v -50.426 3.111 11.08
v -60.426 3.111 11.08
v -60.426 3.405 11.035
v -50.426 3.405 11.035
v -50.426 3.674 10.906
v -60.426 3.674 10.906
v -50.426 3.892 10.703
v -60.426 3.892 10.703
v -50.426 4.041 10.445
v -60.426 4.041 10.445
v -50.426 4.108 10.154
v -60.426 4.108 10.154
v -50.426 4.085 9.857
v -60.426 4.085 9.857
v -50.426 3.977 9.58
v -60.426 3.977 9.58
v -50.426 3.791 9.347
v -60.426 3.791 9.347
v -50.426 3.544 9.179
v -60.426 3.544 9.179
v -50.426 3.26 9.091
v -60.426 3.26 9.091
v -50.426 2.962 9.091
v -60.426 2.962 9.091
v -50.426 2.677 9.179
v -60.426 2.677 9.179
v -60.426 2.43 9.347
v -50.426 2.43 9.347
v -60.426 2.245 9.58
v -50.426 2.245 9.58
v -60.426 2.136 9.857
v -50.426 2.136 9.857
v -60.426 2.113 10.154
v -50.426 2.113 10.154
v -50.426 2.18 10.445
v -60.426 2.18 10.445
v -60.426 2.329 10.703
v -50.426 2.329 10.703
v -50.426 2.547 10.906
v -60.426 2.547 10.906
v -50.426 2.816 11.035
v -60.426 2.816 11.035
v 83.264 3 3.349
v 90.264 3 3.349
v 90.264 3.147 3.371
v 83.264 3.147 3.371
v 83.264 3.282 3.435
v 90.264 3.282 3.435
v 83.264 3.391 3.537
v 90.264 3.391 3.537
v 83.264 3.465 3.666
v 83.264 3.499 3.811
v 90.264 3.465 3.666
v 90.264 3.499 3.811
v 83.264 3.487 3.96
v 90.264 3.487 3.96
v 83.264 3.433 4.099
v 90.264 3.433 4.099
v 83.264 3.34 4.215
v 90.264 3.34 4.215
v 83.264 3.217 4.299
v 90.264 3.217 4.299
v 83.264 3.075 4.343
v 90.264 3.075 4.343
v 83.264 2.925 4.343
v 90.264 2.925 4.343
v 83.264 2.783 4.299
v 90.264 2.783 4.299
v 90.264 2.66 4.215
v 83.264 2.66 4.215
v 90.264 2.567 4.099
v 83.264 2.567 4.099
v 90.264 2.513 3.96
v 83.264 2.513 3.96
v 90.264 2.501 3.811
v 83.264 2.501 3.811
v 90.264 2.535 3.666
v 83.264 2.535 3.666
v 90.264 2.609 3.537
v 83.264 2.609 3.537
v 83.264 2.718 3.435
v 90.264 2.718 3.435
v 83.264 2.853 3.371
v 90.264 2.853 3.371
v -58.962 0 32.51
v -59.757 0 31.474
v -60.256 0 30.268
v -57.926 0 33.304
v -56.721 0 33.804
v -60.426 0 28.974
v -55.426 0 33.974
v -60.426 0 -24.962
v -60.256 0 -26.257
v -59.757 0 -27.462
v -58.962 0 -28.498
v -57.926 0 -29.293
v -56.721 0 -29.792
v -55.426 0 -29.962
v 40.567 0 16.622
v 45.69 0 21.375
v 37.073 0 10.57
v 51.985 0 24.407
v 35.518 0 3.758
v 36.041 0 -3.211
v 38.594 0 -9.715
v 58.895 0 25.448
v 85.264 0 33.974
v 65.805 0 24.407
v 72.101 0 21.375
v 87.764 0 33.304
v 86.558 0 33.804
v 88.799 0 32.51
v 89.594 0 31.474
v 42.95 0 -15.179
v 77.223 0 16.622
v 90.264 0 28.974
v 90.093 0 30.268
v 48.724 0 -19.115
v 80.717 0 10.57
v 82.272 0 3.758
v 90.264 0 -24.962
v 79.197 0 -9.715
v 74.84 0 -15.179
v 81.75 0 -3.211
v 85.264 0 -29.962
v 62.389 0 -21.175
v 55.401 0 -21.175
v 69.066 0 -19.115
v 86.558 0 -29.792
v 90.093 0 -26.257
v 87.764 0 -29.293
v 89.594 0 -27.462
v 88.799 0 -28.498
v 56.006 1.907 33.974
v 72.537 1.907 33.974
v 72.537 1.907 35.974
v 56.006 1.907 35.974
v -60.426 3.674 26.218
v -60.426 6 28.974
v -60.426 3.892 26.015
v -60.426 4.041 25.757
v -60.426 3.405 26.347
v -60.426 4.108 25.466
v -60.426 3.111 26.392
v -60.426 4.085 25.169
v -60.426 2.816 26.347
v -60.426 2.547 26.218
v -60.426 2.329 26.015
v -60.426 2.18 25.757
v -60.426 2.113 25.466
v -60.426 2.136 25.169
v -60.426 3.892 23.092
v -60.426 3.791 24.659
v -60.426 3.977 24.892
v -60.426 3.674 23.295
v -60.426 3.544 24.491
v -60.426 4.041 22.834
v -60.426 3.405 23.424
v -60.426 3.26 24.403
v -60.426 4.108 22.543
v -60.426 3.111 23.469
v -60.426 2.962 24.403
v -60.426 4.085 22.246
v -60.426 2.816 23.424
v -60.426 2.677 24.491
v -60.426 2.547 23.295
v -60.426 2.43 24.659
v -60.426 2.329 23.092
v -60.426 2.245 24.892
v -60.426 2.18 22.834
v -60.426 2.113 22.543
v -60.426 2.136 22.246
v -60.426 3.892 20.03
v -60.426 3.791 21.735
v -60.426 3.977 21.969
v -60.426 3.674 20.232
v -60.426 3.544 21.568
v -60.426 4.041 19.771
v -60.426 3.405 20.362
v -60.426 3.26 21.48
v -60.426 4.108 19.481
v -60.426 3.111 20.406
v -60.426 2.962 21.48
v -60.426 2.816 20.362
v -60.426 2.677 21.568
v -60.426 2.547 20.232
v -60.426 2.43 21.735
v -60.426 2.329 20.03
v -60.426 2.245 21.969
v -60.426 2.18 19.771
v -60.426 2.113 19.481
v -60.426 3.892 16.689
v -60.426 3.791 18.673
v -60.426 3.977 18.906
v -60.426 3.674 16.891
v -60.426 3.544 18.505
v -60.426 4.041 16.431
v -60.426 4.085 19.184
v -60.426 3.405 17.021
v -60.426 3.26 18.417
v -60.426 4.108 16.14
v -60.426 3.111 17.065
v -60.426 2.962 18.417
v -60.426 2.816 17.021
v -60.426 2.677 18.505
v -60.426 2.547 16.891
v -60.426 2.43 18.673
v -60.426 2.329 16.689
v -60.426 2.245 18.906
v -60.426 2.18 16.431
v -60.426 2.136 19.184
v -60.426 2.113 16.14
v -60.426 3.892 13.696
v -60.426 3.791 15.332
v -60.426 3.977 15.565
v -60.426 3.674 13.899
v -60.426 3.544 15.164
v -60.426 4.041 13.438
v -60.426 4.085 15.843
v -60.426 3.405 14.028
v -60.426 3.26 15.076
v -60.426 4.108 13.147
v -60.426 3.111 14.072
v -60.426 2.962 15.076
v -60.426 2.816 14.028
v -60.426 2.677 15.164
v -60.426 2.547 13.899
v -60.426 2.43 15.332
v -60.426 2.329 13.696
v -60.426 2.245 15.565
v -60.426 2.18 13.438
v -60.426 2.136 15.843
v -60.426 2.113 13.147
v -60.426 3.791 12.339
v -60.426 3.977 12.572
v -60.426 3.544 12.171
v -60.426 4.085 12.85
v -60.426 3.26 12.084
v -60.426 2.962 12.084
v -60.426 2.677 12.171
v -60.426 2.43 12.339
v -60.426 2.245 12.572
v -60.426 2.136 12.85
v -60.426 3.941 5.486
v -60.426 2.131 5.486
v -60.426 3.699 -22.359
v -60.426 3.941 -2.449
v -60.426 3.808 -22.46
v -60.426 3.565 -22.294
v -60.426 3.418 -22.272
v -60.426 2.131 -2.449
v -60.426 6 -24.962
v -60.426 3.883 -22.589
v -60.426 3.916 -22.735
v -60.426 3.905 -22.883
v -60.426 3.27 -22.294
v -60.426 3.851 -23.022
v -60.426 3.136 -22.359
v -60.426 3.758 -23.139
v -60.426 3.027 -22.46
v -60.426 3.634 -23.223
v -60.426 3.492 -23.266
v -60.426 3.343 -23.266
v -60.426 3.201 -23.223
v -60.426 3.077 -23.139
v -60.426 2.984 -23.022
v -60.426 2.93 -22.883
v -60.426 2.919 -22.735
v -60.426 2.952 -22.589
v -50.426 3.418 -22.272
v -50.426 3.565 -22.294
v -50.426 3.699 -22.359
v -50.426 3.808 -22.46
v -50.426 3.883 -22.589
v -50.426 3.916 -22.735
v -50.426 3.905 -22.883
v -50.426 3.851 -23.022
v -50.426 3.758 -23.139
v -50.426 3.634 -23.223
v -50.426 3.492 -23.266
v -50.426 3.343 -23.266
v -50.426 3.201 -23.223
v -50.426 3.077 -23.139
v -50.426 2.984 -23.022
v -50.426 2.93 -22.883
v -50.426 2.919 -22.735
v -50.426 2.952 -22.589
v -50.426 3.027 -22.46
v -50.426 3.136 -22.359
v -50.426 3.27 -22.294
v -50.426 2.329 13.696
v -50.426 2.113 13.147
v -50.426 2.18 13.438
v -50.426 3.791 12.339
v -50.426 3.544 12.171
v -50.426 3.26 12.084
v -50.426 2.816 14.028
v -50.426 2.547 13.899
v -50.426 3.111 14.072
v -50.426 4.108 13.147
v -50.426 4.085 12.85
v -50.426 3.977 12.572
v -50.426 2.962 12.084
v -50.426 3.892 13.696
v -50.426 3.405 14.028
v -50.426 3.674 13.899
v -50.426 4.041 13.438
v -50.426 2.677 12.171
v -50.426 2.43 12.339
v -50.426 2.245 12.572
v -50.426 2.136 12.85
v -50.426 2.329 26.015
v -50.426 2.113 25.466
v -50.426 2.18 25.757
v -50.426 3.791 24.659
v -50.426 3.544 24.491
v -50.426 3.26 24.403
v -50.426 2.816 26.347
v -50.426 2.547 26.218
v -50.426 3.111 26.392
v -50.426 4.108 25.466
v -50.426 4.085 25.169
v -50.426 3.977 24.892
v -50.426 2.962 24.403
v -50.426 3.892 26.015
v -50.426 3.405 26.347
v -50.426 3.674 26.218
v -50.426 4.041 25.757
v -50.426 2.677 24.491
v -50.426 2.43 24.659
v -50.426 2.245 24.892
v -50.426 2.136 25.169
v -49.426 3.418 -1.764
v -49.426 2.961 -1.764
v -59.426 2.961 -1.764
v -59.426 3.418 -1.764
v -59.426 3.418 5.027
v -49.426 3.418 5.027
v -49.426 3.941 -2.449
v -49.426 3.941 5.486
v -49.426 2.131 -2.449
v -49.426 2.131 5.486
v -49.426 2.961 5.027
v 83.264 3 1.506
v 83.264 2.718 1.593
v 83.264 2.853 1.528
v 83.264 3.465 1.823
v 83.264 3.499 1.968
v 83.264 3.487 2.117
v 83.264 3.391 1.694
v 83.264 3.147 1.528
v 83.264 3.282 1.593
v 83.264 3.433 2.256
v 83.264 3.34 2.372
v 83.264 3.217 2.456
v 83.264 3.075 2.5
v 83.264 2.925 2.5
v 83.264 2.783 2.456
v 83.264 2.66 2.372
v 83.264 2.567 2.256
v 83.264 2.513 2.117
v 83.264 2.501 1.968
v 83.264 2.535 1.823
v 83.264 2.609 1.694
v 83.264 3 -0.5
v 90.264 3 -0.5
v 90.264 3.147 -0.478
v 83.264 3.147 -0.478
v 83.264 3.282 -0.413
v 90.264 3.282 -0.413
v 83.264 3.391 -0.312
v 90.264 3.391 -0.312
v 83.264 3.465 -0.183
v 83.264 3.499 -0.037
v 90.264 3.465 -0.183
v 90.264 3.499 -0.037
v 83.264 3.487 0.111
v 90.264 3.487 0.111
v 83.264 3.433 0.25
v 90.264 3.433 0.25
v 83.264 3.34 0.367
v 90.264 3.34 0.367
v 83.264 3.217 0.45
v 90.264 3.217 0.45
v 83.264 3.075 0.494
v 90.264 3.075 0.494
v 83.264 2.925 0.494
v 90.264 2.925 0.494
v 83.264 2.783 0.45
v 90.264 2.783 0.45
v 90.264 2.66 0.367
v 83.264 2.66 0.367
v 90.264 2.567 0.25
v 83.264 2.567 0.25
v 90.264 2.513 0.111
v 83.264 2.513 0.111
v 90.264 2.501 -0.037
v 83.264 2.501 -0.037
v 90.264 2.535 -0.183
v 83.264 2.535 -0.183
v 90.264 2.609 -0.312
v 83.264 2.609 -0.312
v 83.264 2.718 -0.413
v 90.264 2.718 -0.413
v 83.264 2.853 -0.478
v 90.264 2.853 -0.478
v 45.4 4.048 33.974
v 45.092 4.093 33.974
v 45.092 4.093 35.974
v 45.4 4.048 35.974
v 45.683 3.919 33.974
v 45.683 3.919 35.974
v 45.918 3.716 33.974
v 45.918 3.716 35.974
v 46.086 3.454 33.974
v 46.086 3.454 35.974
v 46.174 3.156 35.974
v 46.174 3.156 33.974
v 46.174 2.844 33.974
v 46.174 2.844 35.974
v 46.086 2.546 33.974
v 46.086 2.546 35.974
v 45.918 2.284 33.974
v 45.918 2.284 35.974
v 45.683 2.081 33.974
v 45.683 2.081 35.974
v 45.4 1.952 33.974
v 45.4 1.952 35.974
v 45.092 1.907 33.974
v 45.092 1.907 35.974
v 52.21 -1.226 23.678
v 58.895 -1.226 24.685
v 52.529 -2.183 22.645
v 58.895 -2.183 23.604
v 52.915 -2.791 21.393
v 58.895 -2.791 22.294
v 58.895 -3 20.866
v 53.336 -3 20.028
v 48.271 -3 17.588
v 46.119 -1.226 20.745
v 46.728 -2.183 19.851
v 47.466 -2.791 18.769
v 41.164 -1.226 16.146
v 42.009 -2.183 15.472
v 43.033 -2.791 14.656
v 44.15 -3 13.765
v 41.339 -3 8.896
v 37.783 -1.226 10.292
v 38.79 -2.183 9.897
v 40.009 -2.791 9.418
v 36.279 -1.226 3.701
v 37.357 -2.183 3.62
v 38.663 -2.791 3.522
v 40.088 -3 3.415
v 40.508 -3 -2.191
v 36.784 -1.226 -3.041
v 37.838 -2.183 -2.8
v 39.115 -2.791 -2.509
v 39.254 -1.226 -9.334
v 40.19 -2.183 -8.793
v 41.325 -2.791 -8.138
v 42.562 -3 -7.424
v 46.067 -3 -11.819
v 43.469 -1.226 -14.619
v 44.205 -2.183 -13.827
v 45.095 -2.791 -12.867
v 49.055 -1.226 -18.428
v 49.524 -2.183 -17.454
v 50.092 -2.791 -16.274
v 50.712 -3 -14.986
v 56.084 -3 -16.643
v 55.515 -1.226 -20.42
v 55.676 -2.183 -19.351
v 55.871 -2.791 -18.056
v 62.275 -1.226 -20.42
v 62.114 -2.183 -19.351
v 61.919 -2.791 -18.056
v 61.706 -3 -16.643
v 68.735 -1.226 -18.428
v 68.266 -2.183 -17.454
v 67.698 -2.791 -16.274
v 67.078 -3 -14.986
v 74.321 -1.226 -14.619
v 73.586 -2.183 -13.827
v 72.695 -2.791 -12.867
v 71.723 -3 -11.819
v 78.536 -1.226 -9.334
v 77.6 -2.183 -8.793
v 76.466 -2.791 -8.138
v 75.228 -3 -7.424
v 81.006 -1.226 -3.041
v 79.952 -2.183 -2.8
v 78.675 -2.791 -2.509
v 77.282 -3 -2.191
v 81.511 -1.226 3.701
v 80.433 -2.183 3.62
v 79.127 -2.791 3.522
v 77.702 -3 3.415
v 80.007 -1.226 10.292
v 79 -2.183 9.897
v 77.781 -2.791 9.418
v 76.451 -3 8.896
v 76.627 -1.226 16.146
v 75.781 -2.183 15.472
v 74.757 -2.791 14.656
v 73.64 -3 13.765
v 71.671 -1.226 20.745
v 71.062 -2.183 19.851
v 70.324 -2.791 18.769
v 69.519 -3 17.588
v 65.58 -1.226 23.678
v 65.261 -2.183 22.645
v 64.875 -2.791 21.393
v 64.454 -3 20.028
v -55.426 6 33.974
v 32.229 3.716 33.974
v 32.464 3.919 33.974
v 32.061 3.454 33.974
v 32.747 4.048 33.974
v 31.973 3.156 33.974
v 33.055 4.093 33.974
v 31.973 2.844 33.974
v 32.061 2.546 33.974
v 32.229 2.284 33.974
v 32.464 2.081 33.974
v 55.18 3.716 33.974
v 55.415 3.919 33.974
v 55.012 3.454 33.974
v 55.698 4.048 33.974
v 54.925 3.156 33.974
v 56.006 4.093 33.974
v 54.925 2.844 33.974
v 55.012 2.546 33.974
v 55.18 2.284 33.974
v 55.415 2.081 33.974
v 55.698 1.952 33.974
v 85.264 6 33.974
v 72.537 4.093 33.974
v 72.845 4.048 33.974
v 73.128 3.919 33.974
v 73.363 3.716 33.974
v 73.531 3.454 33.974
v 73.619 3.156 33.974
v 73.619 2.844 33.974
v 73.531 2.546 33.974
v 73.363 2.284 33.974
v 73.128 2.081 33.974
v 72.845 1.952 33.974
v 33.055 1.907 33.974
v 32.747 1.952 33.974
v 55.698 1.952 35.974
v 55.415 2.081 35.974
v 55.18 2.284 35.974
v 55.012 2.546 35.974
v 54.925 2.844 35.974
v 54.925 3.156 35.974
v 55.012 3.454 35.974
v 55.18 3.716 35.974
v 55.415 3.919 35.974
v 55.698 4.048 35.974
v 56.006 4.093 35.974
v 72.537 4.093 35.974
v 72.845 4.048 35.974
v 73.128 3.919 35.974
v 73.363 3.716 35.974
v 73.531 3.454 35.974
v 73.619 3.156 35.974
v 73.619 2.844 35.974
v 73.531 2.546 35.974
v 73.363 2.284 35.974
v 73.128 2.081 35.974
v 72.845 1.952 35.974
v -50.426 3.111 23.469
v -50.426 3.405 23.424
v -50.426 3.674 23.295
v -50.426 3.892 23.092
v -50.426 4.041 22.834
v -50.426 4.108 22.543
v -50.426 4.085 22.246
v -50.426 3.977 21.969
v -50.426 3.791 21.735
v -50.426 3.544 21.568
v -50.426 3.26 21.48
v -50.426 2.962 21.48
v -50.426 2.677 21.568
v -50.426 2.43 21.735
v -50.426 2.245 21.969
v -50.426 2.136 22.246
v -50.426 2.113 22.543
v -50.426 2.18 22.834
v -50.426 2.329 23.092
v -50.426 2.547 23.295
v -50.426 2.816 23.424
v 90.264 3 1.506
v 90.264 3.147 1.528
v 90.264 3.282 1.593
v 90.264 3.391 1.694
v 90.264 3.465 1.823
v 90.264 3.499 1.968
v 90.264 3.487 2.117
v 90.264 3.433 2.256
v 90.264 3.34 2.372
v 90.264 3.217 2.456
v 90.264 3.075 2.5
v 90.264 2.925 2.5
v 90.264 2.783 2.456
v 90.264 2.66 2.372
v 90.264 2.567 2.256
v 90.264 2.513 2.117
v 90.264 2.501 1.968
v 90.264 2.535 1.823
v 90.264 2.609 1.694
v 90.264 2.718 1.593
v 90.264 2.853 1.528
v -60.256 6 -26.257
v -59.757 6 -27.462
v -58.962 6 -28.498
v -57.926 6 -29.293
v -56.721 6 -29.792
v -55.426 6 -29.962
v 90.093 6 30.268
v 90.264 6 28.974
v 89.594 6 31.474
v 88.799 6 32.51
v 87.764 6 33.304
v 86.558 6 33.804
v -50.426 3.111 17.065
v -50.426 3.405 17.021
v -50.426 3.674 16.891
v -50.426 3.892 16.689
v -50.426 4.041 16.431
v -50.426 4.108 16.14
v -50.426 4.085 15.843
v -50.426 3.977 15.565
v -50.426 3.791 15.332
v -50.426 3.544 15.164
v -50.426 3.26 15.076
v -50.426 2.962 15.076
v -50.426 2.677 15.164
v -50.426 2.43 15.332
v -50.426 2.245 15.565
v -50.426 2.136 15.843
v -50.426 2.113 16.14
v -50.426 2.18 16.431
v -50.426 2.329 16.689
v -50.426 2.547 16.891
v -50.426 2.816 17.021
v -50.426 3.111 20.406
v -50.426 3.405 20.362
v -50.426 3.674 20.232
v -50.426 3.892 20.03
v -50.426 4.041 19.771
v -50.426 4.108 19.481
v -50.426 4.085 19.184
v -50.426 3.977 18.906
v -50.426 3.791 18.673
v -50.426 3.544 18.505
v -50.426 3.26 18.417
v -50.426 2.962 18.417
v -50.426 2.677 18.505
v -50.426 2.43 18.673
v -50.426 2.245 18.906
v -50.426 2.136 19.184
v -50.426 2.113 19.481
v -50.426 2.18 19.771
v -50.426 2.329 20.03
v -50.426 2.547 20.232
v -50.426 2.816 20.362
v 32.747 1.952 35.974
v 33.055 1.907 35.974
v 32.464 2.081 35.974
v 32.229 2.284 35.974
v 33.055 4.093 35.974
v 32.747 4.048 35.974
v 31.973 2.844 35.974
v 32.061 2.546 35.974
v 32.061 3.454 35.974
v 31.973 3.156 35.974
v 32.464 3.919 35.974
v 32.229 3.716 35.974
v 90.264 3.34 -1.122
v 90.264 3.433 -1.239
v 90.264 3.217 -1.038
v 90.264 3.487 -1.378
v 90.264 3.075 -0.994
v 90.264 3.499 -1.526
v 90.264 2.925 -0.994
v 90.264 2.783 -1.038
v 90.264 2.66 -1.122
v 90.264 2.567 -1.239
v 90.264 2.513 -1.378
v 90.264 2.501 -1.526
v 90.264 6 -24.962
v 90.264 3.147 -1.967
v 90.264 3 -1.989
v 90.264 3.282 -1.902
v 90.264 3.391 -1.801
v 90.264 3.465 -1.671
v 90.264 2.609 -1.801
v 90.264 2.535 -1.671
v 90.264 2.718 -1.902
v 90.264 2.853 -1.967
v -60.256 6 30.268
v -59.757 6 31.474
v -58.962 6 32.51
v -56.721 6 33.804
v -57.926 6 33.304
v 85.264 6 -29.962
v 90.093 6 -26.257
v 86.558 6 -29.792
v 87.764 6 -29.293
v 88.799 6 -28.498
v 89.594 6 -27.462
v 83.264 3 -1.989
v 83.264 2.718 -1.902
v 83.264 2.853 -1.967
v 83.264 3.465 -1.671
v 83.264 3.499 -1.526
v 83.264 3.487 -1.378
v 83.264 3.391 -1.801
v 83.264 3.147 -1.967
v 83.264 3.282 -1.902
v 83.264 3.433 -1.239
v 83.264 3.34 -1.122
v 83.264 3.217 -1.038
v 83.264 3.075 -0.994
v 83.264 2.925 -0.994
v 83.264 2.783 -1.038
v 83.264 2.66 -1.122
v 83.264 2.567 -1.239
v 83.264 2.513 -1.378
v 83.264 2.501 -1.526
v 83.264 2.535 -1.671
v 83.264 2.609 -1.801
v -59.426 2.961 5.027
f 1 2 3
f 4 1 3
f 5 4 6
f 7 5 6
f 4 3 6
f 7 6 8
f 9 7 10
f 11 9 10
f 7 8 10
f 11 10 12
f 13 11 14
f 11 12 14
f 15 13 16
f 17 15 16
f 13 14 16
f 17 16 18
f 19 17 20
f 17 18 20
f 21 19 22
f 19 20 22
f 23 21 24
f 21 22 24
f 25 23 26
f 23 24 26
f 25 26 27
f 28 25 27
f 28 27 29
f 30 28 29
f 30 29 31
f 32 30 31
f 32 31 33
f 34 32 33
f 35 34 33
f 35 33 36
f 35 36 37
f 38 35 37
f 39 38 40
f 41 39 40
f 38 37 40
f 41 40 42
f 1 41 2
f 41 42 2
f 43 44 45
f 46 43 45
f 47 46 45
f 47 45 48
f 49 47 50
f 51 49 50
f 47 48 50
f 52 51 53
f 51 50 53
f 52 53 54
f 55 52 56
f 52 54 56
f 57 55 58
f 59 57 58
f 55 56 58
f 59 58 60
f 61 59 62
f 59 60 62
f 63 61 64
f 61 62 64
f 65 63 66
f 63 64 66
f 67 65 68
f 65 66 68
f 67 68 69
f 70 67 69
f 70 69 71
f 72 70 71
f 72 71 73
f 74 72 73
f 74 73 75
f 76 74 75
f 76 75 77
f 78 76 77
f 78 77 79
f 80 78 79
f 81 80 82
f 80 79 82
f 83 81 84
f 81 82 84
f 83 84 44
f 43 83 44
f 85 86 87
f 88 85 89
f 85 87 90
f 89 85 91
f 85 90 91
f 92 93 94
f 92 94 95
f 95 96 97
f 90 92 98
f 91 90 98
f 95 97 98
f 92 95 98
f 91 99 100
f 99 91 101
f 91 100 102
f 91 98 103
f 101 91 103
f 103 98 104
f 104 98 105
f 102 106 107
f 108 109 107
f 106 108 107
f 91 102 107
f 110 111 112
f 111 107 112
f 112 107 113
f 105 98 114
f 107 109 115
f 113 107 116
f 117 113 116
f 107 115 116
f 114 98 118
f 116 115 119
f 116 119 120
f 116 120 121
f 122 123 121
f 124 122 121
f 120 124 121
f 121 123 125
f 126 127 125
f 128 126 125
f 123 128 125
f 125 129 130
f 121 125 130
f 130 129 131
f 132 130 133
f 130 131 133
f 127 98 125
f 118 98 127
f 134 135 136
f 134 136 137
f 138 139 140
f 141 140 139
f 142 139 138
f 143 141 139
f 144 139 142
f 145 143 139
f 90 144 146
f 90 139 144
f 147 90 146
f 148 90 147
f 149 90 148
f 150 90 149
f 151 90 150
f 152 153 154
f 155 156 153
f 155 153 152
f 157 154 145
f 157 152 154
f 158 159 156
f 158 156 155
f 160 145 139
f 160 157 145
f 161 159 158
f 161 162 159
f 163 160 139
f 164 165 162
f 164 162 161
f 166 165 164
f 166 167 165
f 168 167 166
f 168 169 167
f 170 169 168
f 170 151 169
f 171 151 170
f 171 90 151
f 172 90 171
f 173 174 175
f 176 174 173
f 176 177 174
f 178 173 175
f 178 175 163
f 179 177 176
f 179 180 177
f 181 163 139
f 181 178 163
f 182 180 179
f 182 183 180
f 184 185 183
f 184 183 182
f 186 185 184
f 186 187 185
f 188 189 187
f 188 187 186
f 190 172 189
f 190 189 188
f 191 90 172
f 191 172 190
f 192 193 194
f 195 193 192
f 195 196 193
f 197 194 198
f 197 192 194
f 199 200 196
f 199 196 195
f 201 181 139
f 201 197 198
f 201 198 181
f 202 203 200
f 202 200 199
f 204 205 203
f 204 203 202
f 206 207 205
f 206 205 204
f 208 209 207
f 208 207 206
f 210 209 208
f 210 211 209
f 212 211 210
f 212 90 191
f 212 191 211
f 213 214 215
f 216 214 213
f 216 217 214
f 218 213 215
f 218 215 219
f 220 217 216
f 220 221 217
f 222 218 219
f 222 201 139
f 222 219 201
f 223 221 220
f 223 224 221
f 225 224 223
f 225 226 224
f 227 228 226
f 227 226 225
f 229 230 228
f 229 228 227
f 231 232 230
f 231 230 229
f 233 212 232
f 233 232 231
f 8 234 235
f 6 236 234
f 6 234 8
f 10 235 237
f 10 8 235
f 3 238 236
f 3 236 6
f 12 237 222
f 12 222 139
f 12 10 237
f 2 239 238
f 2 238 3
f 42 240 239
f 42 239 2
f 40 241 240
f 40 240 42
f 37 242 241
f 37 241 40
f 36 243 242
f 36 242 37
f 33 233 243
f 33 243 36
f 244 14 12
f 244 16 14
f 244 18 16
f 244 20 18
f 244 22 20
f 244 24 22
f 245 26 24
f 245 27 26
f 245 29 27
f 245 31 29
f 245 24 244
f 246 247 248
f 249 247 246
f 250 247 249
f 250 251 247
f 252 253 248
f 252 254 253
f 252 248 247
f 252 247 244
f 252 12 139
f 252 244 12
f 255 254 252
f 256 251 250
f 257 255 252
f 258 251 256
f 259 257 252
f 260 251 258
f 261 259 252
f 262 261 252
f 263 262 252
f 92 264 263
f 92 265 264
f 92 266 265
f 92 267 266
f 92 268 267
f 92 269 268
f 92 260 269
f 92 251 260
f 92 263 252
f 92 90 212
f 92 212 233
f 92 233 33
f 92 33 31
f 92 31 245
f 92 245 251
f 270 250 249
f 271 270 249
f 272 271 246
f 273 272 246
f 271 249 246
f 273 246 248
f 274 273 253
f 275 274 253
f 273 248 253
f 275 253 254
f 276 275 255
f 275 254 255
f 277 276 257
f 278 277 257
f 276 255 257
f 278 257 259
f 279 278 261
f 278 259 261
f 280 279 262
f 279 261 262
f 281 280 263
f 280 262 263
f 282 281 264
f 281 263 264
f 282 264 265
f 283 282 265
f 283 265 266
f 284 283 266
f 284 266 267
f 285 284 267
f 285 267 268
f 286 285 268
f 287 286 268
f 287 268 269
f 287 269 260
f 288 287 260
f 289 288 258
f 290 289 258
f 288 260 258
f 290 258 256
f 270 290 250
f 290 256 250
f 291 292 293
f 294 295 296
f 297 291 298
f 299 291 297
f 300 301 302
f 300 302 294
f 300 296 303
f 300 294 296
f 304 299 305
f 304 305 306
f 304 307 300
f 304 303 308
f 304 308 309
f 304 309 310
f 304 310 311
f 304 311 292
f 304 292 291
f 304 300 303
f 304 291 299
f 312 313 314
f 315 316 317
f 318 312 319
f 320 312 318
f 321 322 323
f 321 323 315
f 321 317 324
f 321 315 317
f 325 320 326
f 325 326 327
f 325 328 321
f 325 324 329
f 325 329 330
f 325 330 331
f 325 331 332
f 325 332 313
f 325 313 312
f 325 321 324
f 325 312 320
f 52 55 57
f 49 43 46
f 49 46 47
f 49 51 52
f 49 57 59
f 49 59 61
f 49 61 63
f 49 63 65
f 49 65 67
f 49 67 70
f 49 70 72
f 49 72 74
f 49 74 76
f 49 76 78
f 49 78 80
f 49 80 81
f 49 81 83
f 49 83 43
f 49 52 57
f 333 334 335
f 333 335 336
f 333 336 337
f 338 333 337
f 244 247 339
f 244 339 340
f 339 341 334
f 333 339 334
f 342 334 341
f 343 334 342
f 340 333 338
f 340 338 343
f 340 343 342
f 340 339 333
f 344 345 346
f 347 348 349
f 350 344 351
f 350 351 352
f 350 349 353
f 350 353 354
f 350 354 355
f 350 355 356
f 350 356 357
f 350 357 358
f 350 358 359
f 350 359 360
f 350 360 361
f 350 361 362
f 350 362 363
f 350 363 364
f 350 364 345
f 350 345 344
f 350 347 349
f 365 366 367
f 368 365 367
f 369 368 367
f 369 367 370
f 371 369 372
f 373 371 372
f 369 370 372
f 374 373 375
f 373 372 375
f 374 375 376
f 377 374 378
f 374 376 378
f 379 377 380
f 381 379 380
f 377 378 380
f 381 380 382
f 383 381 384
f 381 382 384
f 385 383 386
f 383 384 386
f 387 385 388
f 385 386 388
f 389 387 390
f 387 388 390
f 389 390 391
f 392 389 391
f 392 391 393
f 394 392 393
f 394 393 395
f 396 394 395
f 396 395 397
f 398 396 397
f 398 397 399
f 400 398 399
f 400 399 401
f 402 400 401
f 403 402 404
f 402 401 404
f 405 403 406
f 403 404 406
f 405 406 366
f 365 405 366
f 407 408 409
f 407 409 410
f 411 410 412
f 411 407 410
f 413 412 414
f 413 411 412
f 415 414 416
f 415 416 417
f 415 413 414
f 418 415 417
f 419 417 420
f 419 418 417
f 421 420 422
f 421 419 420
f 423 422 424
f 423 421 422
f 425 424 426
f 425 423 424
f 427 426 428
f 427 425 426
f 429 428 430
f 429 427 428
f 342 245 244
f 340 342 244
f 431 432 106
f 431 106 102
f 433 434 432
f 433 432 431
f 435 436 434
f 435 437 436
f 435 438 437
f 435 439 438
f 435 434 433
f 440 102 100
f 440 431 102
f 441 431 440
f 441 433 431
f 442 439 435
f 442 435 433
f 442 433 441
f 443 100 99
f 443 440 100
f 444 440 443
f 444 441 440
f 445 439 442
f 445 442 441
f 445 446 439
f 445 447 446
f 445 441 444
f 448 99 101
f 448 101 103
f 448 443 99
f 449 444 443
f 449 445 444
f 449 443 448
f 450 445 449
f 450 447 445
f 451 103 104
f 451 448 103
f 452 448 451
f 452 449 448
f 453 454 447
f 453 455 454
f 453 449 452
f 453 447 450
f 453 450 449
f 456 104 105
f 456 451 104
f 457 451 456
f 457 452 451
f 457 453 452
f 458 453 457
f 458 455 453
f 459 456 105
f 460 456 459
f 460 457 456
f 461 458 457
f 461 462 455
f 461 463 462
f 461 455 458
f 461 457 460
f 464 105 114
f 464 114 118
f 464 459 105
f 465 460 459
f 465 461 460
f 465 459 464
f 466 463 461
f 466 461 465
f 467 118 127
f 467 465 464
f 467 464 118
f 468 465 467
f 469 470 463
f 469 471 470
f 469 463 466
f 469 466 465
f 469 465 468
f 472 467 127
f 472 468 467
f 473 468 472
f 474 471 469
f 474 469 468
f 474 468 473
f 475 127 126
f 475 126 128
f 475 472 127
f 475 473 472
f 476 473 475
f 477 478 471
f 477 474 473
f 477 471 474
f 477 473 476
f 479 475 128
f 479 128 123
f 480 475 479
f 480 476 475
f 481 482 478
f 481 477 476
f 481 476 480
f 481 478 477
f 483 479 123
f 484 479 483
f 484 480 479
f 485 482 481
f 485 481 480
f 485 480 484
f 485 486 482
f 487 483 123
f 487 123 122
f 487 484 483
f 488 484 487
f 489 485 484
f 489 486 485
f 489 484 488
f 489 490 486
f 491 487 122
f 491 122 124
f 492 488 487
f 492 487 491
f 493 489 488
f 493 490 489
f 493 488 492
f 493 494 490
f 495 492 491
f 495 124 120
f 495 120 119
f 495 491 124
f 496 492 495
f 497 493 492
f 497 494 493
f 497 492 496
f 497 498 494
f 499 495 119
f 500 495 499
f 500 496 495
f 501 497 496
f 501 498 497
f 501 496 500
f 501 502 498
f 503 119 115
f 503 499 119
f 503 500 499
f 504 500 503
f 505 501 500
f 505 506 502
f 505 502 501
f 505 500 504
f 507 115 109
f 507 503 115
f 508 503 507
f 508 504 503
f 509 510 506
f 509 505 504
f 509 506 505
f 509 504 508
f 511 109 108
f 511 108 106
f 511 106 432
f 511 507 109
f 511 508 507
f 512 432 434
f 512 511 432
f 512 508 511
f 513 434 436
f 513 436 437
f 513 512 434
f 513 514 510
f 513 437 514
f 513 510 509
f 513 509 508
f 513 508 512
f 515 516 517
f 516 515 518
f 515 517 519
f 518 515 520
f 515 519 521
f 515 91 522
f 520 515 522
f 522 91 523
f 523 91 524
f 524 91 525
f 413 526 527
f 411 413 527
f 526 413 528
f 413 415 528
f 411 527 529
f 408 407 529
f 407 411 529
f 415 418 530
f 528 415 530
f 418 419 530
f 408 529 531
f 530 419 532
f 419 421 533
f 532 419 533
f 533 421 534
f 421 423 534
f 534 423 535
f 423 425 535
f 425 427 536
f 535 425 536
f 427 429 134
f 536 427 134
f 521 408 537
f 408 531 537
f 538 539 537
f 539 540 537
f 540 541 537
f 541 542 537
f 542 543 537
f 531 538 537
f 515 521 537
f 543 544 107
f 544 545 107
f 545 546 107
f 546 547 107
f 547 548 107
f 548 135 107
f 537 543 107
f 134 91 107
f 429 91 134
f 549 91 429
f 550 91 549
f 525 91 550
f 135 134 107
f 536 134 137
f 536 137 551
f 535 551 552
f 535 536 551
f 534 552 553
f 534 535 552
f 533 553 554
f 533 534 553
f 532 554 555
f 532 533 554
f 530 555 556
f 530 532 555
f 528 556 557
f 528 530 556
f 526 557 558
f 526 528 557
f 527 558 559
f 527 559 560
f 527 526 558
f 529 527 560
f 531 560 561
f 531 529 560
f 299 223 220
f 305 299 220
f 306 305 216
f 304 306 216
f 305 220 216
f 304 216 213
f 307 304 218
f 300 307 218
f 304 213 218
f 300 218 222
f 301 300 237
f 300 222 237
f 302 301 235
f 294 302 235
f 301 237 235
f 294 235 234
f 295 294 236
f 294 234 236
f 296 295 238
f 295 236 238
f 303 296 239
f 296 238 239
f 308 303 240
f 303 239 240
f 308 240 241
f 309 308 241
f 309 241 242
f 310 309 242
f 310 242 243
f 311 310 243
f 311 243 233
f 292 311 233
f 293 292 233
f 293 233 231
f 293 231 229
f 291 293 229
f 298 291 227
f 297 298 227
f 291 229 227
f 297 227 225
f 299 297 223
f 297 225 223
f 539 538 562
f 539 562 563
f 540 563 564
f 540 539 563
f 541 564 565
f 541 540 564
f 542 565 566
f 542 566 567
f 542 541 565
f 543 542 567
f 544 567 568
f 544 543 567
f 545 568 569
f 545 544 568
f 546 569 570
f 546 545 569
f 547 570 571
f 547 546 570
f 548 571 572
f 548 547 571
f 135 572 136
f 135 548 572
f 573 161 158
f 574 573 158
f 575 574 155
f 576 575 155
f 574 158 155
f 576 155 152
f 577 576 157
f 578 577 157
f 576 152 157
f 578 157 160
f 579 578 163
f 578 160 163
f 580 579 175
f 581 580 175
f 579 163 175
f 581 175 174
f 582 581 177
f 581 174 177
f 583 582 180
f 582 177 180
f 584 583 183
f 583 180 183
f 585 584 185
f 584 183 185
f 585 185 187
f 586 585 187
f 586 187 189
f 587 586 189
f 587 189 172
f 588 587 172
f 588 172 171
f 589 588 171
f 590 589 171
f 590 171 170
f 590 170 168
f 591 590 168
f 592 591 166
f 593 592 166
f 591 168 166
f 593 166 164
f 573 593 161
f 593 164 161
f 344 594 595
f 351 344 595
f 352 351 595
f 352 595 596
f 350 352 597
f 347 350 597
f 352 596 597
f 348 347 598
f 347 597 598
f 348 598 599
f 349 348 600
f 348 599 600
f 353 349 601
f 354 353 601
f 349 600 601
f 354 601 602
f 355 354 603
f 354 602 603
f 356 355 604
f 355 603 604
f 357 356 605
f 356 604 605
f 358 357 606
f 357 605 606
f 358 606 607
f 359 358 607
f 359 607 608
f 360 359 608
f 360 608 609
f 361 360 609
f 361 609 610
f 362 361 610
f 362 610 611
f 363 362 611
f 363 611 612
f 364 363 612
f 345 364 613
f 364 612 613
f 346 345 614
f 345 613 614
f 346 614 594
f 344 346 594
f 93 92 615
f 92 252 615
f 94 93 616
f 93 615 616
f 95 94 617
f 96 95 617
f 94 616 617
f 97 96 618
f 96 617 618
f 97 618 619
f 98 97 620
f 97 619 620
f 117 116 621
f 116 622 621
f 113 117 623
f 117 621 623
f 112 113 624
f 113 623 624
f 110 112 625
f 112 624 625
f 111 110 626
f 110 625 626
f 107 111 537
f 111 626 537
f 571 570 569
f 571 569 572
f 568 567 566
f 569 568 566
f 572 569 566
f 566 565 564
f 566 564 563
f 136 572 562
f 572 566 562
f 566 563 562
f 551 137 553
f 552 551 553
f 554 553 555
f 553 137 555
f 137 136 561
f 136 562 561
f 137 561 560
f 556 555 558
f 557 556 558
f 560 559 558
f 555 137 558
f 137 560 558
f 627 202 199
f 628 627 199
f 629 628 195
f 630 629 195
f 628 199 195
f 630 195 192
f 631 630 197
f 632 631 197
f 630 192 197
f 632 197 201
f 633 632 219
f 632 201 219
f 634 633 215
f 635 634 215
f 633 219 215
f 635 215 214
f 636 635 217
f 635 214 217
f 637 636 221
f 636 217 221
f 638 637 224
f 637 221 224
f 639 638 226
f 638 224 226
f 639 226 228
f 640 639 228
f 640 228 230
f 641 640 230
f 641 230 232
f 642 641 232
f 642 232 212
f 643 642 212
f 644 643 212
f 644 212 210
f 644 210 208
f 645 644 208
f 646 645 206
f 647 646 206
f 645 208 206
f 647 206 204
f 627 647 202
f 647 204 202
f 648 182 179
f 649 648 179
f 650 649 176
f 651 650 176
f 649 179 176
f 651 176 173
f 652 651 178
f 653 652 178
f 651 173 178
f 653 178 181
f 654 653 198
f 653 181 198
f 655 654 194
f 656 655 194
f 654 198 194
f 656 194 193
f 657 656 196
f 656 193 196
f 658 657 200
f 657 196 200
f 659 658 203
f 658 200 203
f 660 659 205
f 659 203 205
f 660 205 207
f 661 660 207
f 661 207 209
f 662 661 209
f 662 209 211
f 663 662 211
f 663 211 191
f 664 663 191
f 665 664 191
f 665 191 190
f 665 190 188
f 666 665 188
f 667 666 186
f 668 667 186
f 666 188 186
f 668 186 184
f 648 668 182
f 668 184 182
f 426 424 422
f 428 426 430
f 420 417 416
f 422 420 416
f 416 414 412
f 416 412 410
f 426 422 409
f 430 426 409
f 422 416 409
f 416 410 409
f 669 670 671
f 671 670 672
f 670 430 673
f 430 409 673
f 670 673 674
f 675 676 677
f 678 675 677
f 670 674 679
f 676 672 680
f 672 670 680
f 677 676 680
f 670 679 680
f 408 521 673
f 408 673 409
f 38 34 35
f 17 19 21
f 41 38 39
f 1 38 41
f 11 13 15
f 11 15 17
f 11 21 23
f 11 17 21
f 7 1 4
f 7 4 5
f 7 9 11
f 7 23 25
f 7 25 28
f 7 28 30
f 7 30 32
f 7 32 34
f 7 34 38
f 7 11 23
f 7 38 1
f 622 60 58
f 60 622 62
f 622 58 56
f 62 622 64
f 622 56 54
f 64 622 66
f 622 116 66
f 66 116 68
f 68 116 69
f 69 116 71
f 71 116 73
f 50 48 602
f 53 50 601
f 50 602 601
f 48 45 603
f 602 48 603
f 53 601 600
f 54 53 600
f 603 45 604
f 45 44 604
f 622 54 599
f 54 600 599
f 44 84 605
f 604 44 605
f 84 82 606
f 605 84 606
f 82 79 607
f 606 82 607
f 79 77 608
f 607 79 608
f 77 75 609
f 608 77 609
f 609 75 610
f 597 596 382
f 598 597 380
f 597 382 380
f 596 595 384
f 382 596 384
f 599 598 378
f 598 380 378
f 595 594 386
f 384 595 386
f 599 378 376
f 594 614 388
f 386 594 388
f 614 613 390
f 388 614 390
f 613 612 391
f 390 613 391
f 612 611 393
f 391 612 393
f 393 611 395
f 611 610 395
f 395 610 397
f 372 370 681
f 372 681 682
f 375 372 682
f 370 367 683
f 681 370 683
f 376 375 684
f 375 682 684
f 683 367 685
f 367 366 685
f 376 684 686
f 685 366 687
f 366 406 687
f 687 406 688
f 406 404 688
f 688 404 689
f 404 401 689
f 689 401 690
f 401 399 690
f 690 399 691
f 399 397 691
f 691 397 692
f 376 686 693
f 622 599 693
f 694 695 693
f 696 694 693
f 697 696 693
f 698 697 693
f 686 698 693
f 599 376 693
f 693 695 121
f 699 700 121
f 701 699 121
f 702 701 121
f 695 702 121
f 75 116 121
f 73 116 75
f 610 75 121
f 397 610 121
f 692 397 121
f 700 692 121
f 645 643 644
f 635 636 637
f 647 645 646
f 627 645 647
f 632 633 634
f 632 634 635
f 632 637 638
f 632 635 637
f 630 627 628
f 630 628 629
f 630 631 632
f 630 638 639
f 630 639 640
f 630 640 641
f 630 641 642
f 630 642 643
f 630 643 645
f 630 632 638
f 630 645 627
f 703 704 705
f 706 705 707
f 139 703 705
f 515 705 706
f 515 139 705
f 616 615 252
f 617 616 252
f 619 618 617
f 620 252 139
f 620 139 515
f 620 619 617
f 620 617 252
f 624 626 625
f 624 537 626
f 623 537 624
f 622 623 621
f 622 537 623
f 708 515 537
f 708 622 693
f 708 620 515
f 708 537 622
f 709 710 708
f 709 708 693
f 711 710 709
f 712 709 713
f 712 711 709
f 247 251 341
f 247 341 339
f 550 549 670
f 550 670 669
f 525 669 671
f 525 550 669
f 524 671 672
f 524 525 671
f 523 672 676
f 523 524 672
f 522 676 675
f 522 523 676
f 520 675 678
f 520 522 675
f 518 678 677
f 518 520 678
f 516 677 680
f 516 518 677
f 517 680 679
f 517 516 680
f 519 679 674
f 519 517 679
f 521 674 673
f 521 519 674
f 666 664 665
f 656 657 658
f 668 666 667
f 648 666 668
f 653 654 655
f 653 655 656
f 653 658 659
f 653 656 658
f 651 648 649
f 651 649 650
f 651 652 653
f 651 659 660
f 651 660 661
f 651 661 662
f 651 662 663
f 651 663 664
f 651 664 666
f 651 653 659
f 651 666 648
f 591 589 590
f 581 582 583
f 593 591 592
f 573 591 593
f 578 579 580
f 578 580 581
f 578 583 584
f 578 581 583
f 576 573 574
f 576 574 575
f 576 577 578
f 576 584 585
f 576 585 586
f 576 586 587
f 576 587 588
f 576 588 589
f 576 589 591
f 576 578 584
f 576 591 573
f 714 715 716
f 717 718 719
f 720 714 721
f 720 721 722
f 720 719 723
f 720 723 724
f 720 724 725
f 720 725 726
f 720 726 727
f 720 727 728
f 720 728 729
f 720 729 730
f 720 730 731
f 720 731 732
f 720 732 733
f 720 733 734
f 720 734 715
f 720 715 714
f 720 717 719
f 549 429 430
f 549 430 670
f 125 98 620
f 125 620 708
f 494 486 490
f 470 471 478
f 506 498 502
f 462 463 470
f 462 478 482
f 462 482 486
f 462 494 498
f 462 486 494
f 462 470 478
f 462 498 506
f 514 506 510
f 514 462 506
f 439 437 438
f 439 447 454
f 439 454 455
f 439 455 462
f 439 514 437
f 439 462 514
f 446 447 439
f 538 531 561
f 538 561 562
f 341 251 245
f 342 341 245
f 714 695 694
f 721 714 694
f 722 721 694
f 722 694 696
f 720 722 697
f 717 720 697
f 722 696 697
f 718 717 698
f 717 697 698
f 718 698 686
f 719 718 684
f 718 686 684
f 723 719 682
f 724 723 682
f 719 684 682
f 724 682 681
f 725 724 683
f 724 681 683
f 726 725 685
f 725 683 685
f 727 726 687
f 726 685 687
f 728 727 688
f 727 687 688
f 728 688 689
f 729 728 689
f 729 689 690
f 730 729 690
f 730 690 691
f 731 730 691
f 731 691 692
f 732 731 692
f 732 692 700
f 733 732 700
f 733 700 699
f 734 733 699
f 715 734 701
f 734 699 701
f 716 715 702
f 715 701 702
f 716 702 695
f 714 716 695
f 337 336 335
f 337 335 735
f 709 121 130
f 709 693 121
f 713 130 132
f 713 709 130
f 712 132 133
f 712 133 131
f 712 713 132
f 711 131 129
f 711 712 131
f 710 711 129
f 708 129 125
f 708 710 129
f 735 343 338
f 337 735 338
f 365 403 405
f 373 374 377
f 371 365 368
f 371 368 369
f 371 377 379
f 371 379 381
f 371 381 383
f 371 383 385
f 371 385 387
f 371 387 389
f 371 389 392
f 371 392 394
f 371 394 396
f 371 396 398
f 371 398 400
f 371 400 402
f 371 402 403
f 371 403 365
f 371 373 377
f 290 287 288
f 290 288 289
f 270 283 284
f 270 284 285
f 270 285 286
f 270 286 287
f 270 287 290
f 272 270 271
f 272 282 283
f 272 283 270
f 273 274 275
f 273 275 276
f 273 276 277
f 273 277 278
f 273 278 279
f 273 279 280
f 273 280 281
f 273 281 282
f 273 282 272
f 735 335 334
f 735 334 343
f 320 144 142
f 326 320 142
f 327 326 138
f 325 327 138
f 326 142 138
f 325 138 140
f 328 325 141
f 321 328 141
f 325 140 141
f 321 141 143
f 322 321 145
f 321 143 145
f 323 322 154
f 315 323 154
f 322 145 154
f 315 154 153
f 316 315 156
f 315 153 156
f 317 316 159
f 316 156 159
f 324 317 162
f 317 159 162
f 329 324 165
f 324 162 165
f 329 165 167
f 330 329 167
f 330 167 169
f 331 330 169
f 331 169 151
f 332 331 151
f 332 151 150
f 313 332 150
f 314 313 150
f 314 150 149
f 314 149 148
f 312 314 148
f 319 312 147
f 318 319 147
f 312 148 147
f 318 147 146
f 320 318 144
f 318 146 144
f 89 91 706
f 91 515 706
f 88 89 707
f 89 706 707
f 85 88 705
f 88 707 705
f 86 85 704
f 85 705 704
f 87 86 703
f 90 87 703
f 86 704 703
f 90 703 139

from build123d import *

# Parameters (mm, degrees)
SKETCH_1_W          = 150.689919998
SKETCH_1_H          = 63.936654908
EXTRUDE_1_DEPTH     = 6
FILLET_6_R          = 5
FILLET_7_R          = 5
FILLET_8_R          = 5
FILLET_9_R          = 5
SKETCH_2_W          = 7.93449938
SKETCH_2_H          = 1.809622666
CUT_EXTRUDE_1_DEPTH = 11
SKETCH_3_W          = 6.791001318
SKETCH_3_H          = 0.456984439
EXTRUDE_4_DEPTH     = 10
SKETCH_4_R          = 1
CUT_EXTRUDE_2_DEPTH = 10
SKETCH_7_R          = 0.626407846
EXTRUDE_5_DEPTH     = 5.887149494
SKETCH_11_R         = 0.5
CUT_EXTRUDE_4_DEPTH = 10
SKETCH_12_R         = 23.442239877
EXTRUDE_6_DEPTH     = 3
FILLET_11_R         = 5
EXTRUDE_7_DEPTH     = 2
SKETCH_16_R         = 0.5
CUT_EXTRUDE_5_DEPTH = 7


with BuildPart() as part:
    # 草图1 → 凸台-拉伸1 (new body)
    with BuildSketch(Plane(origin=(0, 0, 0), x_dir=(1, 0, 0), z_dir=(0, 1, 0))):
        with Locations((14.918552812, -2.00585584)):
            Rectangle(SKETCH_1_W, SKETCH_1_H)
    extrude(amount=EXTRUDE_1_DEPTH)

    # 圆角6
    fillet_6_edges = [part.edges().sort_by_distance(p)[0] for p in [
        (90.263512811, 3, -29.962471614),
    ]]
    fillet(fillet_6_edges, radius=FILLET_6_R)

    # 圆角7
    fillet_7_edges = [part.edges().sort_by_distance(p)[0] for p in [
        (90.263512811, 3, 33.974183294),
    ]]
    fillet(fillet_7_edges, radius=FILLET_7_R)

    # 圆角8
    fillet_8_edges = [part.edges().sort_by_distance(p)[0] for p in [
        (-60.426407187, 3, 33.974183294),
    ]]
    fillet(fillet_8_edges, radius=FILLET_8_R)

    # 圆角9
    fillet_9_edges = [part.edges().sort_by_distance(p)[0] for p in [
        (-60.426407187, 3, -29.962471614),
    ]]
    fillet(fillet_9_edges, radius=FILLET_9_R)

    # 草图2 → 切除-拉伸1 (cut)
    with BuildSketch(Plane.ZY.offset(60.426407187)):
        with Locations((1.518649738, 3.03572559)):
            Rectangle(SKETCH_2_W, SKETCH_2_H)
    extrude(amount=-CUT_EXTRUDE_1_DEPTH, mode=Mode.SUBTRACT)

    # 草图3 → 凸台-拉伸4 (add)
    with BuildSketch(Plane.ZY.offset(49.426407187)):
        with Locations((1.631220099, 3.18901263)):
            Rectangle(SKETCH_3_W, SKETCH_3_H)
    extrude(amount=EXTRUDE_4_DEPTH)

    # 草图4 → 切除-拉伸2 (cut)
    with BuildSketch(Plane.ZY.offset(60.426407187)):
        with Locations((13.072394448, 3.110545162)):
            Circle(SKETCH_4_R)
        with Locations((16.065231934, 3.110545162)):
            Circle(SKETCH_4_R)
        with Locations((19.406073778, 3.110545162)):
            Circle(SKETCH_4_R)
        with Locations((22.468512134, 3.110545162)):
            Circle(SKETCH_4_R)
        with Locations((10.079556963, 3.110545162)):
            Circle(SKETCH_4_R)
        with Locations((25.391748748, 3.110545162)):
            Circle(SKETCH_4_R)
    extrude(amount=-CUT_EXTRUDE_2_DEPTH, mode=Mode.SUBTRACT)

    # 草图7 → 凸台-拉伸5 (add)
    with BuildSketch(Plane.ZY.offset(50.426407187)):
        with BuildLine():
            Line((-21.86724317, 4.160702093), (-5.58063918, 4.160702093))
            ThreePointArc((-5.58063918, 4.160702093), (-4.53048225, 3.110545162), (-5.58063918, 2.060388231))
            Line((-5.58063918, 2.060388231), (-21.86724317, 2.060388231))
            ThreePointArc((-21.86724317, 2.060388231), (-22.9174001, 3.110545162), (-21.86724317, 4.160702093))
        make_face()
        with Locations((-21.86724317, 3.110545162)):
            Circle(SKETCH_7_R, mode=Mode.SUBTRACT)
    extrude(amount=EXTRUDE_5_DEPTH)

    # 草图11 → 切除-拉伸4 (cut)
    with BuildSketch(Plane.ZY.offset(60.426407187)):
        with Locations((-22.772054502, 3.417504849)):
            Circle(SKETCH_11_R)
    extrude(amount=-CUT_EXTRUDE_4_DEPTH, mode=Mode.SUBTRACT)

    # 草图12 → 凸台-拉伸6 (add)
    with BuildSketch(Plane.XZ):
        with Locations(Location((58.895102962, 2.00585584, 0), (0, 0, 90))):
            Circle(SKETCH_12_R)
    extrude(amount=EXTRUDE_6_DEPTH)

    # 圆角11
    # the kernel refuses this fillet: 5 mm, written as the material it takes off along each edge
    with BuildSketch(Plane(origin=(58.895102962, -3, 2.00585584), x_dir=(0, 0, 1), z_dir=(1, 0, 0))) as fillet_11_piece_1:
        with BuildLine():
            CenterArc((18.859664182, -5), FILLET_11_R, 23.578178478, 66.421821522)
            Line((18.859664182, 0), (18.859664182, 0.1))
            Line((18.859664182, 0.1), (23.442239877, 0.1))
            Line((23.442239877, 0.1), (23.542239877, 0))
            ThreePointArc((23.542239877, 0), (23.542239877, -1.5), (23.533891391, -2.96))
            Line((23.533891391, -2.96), (23.442239877, -3))
        make_face()
    revolve(axis=Axis((58.895102962, -3, 2.00585584), (0, -1, 0)), mode=Mode.SUBTRACT)

    # 草图15 → 凸台-拉伸7 (add)
    with BuildSketch(Plane.XY.offset(33.974183294)):
        with BuildLine():
            Line((72.53746341, 1.907291866), (56.006132514, 1.907291866))
            ThreePointArc((56.006132514, 1.907291866), (54.91342438, 3), (56.006132514, 4.092708134))
            Line((56.006132514, 4.092708134), (72.53746341, 4.092708134))
            ThreePointArc((72.53746341, 4.092708134), (73.630171544, 3), (72.53746341, 1.907291866))
        make_face()
        with BuildLine():
            Line((45.092244156, 1.907291866), (33.05486729, 1.907291866))
            ThreePointArc((33.05486729, 1.907291866), (31.962159155, 3), (33.05486729, 4.092708134))
            Line((33.05486729, 4.092708134), (45.092244156, 4.092708134))
            ThreePointArc((45.092244156, 4.092708134), (46.18495229, 3), (45.092244156, 1.907291866))
        make_face()
    extrude(amount=EXTRUDE_7_DEPTH)

    # 草图16 → 切除-拉伸5 (cut)
    with BuildSketch(Plane(origin=(90.263512811, 0, 0), x_dir=(0, 0, -1), z_dir=(1, 0, 0))):
        with Locations((0, 3)):
            Circle(SKETCH_16_R)
        with Locations((1.488767231, 3)):
            Circle(SKETCH_16_R)
        with Locations((-2.00585584, 3)):
            Circle(SKETCH_16_R)
        with Locations((-3.848597666, 3)):
            Circle(SKETCH_16_R)
    extrude(amount=-CUT_EXTRUDE_5_DEPTH, mode=Mode.SUBTRACT)


solid = part.part
